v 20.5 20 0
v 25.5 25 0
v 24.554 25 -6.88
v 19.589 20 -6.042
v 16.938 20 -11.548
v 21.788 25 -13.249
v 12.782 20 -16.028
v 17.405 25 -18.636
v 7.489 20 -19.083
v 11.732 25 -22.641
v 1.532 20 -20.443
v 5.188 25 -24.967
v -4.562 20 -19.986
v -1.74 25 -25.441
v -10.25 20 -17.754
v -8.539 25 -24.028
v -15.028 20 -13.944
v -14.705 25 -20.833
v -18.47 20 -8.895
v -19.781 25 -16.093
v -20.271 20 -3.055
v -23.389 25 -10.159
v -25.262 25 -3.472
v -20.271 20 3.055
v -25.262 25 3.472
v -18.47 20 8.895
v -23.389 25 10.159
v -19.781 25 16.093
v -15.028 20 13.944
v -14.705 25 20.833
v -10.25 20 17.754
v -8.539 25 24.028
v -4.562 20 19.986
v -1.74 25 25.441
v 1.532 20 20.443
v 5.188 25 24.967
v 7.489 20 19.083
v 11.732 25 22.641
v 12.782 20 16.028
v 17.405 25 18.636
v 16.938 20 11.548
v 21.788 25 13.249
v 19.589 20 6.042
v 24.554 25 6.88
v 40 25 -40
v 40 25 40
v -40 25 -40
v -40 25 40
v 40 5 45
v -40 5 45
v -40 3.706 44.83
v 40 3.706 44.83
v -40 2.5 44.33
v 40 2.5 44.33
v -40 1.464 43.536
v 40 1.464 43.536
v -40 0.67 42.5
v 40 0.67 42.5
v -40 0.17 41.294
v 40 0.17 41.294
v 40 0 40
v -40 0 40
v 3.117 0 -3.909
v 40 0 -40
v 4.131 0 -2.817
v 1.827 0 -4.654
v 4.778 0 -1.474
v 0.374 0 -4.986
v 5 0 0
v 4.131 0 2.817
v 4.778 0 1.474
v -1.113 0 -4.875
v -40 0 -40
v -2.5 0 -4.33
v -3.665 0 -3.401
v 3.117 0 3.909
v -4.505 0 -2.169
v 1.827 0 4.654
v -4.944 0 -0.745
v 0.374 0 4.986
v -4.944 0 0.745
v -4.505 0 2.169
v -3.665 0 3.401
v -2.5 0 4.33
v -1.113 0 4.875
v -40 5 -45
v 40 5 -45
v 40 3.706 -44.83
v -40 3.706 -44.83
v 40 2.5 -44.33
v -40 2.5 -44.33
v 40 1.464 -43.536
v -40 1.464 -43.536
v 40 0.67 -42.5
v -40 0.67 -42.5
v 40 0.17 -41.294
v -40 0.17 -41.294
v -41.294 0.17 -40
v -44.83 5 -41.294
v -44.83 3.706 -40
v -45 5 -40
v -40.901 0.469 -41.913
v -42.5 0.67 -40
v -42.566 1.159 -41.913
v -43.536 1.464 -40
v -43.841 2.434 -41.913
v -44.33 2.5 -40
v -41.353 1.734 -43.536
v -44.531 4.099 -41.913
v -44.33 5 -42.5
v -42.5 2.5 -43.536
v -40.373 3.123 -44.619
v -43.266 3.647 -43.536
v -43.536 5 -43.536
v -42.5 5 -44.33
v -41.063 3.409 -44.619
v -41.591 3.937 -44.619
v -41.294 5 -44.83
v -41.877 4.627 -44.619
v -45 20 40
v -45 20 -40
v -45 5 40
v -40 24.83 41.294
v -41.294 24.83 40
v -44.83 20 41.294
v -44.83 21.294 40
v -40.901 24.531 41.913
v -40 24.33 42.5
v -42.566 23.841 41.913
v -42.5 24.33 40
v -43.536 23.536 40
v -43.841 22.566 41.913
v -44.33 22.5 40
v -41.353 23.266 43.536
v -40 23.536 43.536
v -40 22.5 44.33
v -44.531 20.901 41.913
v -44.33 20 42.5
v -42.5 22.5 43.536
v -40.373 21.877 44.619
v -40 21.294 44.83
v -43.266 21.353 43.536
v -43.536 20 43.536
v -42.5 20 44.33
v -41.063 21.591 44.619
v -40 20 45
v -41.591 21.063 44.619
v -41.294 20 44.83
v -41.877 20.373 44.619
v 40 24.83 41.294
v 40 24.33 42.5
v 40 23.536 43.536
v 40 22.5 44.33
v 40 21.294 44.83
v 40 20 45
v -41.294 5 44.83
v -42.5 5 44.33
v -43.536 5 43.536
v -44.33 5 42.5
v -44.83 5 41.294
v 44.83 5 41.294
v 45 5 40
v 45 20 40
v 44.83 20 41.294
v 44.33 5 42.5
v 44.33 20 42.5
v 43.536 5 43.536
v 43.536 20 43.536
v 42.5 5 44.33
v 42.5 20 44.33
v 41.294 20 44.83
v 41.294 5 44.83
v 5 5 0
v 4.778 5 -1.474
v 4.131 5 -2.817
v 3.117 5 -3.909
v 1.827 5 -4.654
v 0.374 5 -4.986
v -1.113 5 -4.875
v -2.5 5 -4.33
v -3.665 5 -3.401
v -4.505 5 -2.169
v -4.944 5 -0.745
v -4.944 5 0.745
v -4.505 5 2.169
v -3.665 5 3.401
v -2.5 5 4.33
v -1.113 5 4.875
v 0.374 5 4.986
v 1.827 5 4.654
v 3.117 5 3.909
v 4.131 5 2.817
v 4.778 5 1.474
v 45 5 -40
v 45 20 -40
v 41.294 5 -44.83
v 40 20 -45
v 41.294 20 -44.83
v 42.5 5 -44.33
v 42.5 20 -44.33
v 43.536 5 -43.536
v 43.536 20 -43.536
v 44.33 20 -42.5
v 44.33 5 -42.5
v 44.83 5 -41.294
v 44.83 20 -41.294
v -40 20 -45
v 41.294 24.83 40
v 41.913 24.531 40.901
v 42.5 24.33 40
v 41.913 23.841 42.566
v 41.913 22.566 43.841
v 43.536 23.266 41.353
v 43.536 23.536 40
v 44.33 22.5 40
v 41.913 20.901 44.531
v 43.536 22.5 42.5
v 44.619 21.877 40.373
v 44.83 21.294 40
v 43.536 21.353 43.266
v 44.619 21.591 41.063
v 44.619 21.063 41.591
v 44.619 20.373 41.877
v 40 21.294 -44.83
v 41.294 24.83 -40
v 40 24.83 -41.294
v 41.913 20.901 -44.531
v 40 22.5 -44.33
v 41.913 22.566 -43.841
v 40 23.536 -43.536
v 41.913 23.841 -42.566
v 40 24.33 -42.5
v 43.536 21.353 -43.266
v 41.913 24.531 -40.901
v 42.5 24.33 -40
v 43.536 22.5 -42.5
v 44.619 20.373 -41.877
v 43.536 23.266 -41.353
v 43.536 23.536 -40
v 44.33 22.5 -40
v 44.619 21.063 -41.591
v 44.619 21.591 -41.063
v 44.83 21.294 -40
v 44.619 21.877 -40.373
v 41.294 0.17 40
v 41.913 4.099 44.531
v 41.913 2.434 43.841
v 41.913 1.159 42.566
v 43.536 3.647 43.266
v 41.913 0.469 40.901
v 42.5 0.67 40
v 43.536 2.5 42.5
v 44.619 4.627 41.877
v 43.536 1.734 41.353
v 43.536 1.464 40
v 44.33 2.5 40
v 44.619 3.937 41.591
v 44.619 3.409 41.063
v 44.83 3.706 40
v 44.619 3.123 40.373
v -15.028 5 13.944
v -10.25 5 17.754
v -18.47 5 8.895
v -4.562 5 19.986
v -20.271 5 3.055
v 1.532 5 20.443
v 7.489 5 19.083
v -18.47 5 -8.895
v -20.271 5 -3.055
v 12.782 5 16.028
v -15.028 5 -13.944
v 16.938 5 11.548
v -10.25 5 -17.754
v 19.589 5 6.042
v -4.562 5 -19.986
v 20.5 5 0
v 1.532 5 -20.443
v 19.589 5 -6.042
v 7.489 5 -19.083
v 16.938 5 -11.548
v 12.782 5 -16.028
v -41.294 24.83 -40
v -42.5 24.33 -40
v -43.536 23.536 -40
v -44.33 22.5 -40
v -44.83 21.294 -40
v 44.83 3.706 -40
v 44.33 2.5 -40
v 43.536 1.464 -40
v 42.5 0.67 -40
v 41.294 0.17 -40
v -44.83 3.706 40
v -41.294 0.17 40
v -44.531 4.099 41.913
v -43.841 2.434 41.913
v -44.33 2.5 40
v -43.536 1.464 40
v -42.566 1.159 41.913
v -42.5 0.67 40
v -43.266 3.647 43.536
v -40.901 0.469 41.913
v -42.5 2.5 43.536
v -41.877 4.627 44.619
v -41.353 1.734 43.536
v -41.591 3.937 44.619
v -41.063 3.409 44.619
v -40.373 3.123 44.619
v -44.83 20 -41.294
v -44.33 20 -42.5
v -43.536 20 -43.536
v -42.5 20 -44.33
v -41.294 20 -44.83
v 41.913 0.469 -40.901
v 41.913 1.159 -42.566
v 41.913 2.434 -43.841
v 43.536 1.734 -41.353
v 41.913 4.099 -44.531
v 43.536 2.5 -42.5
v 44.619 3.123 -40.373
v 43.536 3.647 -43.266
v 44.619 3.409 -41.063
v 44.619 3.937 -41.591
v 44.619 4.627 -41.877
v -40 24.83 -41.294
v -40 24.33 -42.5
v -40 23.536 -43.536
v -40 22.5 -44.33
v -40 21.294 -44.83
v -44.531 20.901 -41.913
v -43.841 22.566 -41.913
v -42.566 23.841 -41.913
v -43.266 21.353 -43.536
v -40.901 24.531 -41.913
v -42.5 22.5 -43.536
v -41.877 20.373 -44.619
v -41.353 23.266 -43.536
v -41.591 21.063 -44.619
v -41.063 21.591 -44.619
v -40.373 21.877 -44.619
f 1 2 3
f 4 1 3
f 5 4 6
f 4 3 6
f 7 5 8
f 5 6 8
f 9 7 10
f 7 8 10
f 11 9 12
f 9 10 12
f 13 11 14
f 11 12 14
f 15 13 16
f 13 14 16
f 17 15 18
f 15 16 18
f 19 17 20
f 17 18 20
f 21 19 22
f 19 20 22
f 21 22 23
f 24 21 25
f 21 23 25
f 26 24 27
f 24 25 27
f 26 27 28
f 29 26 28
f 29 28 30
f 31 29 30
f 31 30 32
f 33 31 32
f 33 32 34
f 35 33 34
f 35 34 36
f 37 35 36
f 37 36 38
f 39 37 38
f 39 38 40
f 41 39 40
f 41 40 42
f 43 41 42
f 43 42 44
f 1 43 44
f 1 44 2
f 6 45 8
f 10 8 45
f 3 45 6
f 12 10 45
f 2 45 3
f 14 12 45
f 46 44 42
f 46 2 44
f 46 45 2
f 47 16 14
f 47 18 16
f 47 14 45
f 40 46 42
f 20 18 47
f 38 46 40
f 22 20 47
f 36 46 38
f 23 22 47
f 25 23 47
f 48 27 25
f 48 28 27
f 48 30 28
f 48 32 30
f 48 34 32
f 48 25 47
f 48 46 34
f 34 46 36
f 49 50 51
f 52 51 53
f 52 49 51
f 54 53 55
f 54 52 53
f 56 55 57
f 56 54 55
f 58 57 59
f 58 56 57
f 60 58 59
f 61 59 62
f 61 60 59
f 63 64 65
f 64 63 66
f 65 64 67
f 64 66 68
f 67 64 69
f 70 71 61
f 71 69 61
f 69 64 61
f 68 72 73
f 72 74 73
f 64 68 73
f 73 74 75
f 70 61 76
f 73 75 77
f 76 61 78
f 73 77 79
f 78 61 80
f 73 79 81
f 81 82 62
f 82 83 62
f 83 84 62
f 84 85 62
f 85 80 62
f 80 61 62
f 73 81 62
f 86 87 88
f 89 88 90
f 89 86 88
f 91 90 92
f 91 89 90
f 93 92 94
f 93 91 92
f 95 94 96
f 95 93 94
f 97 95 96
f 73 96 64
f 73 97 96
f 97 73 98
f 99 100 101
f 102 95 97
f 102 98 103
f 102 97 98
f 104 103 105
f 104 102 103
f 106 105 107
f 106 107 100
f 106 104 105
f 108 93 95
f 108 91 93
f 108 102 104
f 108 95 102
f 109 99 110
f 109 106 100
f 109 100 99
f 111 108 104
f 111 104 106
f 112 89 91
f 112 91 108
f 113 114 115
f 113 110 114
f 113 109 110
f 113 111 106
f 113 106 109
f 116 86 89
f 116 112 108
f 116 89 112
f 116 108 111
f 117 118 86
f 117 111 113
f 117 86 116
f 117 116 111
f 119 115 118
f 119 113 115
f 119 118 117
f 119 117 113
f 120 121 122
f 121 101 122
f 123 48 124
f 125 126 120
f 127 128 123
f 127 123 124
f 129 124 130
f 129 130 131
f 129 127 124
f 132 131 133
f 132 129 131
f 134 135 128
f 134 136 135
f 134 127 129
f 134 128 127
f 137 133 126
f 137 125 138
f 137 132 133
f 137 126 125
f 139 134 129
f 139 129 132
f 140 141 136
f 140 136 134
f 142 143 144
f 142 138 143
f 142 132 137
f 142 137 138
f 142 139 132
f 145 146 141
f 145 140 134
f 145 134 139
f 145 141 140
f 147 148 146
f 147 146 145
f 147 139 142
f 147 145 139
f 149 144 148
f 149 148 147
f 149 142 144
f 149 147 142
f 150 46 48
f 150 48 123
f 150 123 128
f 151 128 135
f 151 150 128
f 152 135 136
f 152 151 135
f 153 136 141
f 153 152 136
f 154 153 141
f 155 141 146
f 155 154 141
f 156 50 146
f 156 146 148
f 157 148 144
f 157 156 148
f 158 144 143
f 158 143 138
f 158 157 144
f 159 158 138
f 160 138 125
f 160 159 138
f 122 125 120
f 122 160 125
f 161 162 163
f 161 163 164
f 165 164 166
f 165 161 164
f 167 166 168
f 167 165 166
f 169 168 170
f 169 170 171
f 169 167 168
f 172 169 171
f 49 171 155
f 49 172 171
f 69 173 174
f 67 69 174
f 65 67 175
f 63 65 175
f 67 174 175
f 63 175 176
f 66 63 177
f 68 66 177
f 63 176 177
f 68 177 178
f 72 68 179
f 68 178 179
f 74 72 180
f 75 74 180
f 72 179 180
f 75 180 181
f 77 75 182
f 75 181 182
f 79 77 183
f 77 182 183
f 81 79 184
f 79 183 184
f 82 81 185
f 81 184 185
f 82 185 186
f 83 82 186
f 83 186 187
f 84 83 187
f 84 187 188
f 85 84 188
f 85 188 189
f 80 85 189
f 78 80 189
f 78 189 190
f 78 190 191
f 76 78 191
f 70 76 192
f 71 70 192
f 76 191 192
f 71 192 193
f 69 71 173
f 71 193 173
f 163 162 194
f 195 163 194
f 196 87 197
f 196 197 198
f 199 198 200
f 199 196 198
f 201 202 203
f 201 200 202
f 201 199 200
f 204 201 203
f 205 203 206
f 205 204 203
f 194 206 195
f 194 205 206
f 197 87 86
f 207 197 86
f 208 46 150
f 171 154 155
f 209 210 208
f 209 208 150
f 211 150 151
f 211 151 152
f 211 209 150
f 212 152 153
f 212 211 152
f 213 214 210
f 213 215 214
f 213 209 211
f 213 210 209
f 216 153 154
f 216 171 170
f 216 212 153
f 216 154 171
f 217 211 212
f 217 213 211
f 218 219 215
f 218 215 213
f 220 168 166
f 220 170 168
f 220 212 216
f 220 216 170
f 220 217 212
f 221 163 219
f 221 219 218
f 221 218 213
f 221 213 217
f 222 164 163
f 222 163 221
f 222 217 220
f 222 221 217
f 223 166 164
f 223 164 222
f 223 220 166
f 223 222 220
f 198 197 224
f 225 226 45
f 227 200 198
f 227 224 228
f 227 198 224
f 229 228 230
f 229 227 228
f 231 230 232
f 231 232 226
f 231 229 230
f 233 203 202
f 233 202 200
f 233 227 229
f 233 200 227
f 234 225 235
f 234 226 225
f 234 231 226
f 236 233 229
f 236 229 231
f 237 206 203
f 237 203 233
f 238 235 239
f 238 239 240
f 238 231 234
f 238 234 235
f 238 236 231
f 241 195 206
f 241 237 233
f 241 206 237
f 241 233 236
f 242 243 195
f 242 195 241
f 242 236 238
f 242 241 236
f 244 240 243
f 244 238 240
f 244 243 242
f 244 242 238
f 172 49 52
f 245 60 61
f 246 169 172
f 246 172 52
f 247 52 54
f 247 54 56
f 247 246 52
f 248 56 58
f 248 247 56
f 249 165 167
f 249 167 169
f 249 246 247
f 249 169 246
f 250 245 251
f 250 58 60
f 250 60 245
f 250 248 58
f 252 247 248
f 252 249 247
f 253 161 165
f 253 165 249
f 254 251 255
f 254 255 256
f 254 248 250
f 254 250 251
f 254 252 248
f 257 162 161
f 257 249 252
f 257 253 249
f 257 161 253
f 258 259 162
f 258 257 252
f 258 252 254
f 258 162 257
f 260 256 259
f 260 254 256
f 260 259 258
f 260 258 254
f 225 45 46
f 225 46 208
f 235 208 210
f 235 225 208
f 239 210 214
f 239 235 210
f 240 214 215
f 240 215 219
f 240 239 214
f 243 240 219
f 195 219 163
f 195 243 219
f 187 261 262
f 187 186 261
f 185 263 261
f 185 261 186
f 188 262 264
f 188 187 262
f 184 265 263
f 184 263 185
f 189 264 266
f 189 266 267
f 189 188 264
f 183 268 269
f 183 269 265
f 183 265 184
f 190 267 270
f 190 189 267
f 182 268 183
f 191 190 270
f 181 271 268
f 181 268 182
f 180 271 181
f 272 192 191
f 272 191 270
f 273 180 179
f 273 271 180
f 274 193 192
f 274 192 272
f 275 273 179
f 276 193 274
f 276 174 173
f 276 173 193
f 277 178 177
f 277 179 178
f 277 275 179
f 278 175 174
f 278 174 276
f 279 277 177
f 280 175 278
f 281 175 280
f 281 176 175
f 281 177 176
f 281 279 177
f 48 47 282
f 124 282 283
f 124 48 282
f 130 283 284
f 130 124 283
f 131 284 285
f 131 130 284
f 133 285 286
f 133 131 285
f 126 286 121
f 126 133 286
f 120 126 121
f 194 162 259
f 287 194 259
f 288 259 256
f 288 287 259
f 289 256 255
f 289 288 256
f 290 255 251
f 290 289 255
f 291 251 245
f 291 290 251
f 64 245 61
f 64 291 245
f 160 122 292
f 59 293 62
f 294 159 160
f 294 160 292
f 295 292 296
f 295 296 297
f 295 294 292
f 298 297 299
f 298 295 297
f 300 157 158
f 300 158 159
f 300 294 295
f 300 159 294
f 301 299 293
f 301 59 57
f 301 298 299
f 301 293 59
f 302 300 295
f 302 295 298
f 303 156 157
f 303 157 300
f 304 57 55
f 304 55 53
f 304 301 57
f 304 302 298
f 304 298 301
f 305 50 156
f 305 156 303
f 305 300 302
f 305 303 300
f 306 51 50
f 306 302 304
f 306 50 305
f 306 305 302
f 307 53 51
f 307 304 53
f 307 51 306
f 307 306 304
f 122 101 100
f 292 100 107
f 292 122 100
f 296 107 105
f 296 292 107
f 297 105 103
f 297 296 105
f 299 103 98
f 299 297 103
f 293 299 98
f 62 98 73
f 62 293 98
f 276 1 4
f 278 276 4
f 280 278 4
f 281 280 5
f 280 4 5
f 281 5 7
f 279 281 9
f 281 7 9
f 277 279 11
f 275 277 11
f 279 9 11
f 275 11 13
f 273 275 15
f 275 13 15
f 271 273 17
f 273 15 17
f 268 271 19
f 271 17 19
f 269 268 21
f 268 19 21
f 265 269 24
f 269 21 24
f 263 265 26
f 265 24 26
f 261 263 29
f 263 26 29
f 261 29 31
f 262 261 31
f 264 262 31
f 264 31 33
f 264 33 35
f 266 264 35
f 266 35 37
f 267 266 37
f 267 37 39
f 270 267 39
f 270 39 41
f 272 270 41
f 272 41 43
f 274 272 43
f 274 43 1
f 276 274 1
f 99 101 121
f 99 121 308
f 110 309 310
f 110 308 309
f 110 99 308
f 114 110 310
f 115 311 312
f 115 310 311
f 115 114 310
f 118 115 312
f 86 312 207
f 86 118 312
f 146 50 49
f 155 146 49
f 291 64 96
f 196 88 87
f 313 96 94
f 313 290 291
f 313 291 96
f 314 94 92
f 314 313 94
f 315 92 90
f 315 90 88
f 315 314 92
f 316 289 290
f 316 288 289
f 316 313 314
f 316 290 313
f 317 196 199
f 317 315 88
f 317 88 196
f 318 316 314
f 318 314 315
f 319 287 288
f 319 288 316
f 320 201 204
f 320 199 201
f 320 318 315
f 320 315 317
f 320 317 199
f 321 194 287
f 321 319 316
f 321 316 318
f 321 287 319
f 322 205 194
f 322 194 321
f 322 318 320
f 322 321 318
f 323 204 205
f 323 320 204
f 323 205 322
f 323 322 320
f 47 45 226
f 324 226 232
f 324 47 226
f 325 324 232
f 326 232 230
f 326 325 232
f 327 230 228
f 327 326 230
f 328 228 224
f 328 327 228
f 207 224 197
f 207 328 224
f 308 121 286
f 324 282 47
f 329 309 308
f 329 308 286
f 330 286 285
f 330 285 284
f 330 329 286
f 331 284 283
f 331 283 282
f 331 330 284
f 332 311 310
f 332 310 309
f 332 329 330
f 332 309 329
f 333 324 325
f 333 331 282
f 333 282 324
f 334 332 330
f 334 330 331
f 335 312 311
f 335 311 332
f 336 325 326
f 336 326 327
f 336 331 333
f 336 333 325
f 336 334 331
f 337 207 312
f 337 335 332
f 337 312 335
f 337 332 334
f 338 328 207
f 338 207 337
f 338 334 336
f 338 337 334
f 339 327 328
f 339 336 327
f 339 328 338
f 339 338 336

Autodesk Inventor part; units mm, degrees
ref_plane "YZ Plane" through (0, 0, 0) normal (1, 0, 0) x (0, 1, 0)
ref_plane "XZ Plane" through (0, 0, 0) normal (0, 1, 0) x (-1, 0, 0)
ref_plane "XY Plane" through (0, 0, 0) normal (0, 0, 1) x (1, 0, 0)
sketch "Sketch1" plane through (0, 0, 0) normal (0, 1, 0) x (-1, 0, 0)
  line L0 (45, 45) -> (-45, 45)
  line L1 (-45, 45) -> (-45, -45)
  line L2 (-45, -45) -> (45, -45)
  line L3 (45, -45) -> (45, 45)
  line L4 (45, 45) -> (-45, -45)
  line L5 (45, -45) -> (-45, 45)
  point P0 (0, 0)
  point P1 (0, 0)
  dimension "d0" = 90
  dimension "d1" = 90
extrude "Extrusion1" add sketch "Sketch1" along normal blind 25
sketch "Sketch5" plane through (0, 25, 0) normal (0, 1, 0) x (1, 0, 0)
  circle A0 centre (0, 0) radius 20.5
  dimension "d27" = 41
extrude "Extrusion3" cut sketch "Sketch5" against normal blind 20
sketch "Sketch6" plane through (0, 5, 0) normal (0, 1, 0) x (1, 0, 0)
  circle A0 centre (0, 0) radius 5
  dimension "d30" = 10
extrude "Extrusion4" cut sketch "Sketch6" against normal blind 20
fillet "Fillet2" radius 5 8 edges at (45, 0, 0) (0, 0, -45) (-45, 0, 0) (0, 0, 45) (45, 25, 0) (0, 25, -45) (-45, 25, 0) (0, 25, 45)
chamfer "Chamfer1" distance 5 angle 45 1 edges at (-20.5, 25, 0)
fillet "Fillet3" radius 5 12 edges at (43.5355, 23.5355, 43.5355) (43.5355, 1.4645, 43.5355) (45, 12.5, 45) (43.5355, 23.5355, -43.5355) (43.5355, 1.4645, -43.5355) (45, 12.5, -45) (-43.5355, 23.5355, 43.5355) (-43.5355, 1.4645, 43.5355) (-45, 12.5, 45) (-45, 12.5, -45) (-43.5355, 1.4645, -43.5355) (-43.5355, 23.5355, -43.5355)
properties part number "supportbalises_3DPrint"
